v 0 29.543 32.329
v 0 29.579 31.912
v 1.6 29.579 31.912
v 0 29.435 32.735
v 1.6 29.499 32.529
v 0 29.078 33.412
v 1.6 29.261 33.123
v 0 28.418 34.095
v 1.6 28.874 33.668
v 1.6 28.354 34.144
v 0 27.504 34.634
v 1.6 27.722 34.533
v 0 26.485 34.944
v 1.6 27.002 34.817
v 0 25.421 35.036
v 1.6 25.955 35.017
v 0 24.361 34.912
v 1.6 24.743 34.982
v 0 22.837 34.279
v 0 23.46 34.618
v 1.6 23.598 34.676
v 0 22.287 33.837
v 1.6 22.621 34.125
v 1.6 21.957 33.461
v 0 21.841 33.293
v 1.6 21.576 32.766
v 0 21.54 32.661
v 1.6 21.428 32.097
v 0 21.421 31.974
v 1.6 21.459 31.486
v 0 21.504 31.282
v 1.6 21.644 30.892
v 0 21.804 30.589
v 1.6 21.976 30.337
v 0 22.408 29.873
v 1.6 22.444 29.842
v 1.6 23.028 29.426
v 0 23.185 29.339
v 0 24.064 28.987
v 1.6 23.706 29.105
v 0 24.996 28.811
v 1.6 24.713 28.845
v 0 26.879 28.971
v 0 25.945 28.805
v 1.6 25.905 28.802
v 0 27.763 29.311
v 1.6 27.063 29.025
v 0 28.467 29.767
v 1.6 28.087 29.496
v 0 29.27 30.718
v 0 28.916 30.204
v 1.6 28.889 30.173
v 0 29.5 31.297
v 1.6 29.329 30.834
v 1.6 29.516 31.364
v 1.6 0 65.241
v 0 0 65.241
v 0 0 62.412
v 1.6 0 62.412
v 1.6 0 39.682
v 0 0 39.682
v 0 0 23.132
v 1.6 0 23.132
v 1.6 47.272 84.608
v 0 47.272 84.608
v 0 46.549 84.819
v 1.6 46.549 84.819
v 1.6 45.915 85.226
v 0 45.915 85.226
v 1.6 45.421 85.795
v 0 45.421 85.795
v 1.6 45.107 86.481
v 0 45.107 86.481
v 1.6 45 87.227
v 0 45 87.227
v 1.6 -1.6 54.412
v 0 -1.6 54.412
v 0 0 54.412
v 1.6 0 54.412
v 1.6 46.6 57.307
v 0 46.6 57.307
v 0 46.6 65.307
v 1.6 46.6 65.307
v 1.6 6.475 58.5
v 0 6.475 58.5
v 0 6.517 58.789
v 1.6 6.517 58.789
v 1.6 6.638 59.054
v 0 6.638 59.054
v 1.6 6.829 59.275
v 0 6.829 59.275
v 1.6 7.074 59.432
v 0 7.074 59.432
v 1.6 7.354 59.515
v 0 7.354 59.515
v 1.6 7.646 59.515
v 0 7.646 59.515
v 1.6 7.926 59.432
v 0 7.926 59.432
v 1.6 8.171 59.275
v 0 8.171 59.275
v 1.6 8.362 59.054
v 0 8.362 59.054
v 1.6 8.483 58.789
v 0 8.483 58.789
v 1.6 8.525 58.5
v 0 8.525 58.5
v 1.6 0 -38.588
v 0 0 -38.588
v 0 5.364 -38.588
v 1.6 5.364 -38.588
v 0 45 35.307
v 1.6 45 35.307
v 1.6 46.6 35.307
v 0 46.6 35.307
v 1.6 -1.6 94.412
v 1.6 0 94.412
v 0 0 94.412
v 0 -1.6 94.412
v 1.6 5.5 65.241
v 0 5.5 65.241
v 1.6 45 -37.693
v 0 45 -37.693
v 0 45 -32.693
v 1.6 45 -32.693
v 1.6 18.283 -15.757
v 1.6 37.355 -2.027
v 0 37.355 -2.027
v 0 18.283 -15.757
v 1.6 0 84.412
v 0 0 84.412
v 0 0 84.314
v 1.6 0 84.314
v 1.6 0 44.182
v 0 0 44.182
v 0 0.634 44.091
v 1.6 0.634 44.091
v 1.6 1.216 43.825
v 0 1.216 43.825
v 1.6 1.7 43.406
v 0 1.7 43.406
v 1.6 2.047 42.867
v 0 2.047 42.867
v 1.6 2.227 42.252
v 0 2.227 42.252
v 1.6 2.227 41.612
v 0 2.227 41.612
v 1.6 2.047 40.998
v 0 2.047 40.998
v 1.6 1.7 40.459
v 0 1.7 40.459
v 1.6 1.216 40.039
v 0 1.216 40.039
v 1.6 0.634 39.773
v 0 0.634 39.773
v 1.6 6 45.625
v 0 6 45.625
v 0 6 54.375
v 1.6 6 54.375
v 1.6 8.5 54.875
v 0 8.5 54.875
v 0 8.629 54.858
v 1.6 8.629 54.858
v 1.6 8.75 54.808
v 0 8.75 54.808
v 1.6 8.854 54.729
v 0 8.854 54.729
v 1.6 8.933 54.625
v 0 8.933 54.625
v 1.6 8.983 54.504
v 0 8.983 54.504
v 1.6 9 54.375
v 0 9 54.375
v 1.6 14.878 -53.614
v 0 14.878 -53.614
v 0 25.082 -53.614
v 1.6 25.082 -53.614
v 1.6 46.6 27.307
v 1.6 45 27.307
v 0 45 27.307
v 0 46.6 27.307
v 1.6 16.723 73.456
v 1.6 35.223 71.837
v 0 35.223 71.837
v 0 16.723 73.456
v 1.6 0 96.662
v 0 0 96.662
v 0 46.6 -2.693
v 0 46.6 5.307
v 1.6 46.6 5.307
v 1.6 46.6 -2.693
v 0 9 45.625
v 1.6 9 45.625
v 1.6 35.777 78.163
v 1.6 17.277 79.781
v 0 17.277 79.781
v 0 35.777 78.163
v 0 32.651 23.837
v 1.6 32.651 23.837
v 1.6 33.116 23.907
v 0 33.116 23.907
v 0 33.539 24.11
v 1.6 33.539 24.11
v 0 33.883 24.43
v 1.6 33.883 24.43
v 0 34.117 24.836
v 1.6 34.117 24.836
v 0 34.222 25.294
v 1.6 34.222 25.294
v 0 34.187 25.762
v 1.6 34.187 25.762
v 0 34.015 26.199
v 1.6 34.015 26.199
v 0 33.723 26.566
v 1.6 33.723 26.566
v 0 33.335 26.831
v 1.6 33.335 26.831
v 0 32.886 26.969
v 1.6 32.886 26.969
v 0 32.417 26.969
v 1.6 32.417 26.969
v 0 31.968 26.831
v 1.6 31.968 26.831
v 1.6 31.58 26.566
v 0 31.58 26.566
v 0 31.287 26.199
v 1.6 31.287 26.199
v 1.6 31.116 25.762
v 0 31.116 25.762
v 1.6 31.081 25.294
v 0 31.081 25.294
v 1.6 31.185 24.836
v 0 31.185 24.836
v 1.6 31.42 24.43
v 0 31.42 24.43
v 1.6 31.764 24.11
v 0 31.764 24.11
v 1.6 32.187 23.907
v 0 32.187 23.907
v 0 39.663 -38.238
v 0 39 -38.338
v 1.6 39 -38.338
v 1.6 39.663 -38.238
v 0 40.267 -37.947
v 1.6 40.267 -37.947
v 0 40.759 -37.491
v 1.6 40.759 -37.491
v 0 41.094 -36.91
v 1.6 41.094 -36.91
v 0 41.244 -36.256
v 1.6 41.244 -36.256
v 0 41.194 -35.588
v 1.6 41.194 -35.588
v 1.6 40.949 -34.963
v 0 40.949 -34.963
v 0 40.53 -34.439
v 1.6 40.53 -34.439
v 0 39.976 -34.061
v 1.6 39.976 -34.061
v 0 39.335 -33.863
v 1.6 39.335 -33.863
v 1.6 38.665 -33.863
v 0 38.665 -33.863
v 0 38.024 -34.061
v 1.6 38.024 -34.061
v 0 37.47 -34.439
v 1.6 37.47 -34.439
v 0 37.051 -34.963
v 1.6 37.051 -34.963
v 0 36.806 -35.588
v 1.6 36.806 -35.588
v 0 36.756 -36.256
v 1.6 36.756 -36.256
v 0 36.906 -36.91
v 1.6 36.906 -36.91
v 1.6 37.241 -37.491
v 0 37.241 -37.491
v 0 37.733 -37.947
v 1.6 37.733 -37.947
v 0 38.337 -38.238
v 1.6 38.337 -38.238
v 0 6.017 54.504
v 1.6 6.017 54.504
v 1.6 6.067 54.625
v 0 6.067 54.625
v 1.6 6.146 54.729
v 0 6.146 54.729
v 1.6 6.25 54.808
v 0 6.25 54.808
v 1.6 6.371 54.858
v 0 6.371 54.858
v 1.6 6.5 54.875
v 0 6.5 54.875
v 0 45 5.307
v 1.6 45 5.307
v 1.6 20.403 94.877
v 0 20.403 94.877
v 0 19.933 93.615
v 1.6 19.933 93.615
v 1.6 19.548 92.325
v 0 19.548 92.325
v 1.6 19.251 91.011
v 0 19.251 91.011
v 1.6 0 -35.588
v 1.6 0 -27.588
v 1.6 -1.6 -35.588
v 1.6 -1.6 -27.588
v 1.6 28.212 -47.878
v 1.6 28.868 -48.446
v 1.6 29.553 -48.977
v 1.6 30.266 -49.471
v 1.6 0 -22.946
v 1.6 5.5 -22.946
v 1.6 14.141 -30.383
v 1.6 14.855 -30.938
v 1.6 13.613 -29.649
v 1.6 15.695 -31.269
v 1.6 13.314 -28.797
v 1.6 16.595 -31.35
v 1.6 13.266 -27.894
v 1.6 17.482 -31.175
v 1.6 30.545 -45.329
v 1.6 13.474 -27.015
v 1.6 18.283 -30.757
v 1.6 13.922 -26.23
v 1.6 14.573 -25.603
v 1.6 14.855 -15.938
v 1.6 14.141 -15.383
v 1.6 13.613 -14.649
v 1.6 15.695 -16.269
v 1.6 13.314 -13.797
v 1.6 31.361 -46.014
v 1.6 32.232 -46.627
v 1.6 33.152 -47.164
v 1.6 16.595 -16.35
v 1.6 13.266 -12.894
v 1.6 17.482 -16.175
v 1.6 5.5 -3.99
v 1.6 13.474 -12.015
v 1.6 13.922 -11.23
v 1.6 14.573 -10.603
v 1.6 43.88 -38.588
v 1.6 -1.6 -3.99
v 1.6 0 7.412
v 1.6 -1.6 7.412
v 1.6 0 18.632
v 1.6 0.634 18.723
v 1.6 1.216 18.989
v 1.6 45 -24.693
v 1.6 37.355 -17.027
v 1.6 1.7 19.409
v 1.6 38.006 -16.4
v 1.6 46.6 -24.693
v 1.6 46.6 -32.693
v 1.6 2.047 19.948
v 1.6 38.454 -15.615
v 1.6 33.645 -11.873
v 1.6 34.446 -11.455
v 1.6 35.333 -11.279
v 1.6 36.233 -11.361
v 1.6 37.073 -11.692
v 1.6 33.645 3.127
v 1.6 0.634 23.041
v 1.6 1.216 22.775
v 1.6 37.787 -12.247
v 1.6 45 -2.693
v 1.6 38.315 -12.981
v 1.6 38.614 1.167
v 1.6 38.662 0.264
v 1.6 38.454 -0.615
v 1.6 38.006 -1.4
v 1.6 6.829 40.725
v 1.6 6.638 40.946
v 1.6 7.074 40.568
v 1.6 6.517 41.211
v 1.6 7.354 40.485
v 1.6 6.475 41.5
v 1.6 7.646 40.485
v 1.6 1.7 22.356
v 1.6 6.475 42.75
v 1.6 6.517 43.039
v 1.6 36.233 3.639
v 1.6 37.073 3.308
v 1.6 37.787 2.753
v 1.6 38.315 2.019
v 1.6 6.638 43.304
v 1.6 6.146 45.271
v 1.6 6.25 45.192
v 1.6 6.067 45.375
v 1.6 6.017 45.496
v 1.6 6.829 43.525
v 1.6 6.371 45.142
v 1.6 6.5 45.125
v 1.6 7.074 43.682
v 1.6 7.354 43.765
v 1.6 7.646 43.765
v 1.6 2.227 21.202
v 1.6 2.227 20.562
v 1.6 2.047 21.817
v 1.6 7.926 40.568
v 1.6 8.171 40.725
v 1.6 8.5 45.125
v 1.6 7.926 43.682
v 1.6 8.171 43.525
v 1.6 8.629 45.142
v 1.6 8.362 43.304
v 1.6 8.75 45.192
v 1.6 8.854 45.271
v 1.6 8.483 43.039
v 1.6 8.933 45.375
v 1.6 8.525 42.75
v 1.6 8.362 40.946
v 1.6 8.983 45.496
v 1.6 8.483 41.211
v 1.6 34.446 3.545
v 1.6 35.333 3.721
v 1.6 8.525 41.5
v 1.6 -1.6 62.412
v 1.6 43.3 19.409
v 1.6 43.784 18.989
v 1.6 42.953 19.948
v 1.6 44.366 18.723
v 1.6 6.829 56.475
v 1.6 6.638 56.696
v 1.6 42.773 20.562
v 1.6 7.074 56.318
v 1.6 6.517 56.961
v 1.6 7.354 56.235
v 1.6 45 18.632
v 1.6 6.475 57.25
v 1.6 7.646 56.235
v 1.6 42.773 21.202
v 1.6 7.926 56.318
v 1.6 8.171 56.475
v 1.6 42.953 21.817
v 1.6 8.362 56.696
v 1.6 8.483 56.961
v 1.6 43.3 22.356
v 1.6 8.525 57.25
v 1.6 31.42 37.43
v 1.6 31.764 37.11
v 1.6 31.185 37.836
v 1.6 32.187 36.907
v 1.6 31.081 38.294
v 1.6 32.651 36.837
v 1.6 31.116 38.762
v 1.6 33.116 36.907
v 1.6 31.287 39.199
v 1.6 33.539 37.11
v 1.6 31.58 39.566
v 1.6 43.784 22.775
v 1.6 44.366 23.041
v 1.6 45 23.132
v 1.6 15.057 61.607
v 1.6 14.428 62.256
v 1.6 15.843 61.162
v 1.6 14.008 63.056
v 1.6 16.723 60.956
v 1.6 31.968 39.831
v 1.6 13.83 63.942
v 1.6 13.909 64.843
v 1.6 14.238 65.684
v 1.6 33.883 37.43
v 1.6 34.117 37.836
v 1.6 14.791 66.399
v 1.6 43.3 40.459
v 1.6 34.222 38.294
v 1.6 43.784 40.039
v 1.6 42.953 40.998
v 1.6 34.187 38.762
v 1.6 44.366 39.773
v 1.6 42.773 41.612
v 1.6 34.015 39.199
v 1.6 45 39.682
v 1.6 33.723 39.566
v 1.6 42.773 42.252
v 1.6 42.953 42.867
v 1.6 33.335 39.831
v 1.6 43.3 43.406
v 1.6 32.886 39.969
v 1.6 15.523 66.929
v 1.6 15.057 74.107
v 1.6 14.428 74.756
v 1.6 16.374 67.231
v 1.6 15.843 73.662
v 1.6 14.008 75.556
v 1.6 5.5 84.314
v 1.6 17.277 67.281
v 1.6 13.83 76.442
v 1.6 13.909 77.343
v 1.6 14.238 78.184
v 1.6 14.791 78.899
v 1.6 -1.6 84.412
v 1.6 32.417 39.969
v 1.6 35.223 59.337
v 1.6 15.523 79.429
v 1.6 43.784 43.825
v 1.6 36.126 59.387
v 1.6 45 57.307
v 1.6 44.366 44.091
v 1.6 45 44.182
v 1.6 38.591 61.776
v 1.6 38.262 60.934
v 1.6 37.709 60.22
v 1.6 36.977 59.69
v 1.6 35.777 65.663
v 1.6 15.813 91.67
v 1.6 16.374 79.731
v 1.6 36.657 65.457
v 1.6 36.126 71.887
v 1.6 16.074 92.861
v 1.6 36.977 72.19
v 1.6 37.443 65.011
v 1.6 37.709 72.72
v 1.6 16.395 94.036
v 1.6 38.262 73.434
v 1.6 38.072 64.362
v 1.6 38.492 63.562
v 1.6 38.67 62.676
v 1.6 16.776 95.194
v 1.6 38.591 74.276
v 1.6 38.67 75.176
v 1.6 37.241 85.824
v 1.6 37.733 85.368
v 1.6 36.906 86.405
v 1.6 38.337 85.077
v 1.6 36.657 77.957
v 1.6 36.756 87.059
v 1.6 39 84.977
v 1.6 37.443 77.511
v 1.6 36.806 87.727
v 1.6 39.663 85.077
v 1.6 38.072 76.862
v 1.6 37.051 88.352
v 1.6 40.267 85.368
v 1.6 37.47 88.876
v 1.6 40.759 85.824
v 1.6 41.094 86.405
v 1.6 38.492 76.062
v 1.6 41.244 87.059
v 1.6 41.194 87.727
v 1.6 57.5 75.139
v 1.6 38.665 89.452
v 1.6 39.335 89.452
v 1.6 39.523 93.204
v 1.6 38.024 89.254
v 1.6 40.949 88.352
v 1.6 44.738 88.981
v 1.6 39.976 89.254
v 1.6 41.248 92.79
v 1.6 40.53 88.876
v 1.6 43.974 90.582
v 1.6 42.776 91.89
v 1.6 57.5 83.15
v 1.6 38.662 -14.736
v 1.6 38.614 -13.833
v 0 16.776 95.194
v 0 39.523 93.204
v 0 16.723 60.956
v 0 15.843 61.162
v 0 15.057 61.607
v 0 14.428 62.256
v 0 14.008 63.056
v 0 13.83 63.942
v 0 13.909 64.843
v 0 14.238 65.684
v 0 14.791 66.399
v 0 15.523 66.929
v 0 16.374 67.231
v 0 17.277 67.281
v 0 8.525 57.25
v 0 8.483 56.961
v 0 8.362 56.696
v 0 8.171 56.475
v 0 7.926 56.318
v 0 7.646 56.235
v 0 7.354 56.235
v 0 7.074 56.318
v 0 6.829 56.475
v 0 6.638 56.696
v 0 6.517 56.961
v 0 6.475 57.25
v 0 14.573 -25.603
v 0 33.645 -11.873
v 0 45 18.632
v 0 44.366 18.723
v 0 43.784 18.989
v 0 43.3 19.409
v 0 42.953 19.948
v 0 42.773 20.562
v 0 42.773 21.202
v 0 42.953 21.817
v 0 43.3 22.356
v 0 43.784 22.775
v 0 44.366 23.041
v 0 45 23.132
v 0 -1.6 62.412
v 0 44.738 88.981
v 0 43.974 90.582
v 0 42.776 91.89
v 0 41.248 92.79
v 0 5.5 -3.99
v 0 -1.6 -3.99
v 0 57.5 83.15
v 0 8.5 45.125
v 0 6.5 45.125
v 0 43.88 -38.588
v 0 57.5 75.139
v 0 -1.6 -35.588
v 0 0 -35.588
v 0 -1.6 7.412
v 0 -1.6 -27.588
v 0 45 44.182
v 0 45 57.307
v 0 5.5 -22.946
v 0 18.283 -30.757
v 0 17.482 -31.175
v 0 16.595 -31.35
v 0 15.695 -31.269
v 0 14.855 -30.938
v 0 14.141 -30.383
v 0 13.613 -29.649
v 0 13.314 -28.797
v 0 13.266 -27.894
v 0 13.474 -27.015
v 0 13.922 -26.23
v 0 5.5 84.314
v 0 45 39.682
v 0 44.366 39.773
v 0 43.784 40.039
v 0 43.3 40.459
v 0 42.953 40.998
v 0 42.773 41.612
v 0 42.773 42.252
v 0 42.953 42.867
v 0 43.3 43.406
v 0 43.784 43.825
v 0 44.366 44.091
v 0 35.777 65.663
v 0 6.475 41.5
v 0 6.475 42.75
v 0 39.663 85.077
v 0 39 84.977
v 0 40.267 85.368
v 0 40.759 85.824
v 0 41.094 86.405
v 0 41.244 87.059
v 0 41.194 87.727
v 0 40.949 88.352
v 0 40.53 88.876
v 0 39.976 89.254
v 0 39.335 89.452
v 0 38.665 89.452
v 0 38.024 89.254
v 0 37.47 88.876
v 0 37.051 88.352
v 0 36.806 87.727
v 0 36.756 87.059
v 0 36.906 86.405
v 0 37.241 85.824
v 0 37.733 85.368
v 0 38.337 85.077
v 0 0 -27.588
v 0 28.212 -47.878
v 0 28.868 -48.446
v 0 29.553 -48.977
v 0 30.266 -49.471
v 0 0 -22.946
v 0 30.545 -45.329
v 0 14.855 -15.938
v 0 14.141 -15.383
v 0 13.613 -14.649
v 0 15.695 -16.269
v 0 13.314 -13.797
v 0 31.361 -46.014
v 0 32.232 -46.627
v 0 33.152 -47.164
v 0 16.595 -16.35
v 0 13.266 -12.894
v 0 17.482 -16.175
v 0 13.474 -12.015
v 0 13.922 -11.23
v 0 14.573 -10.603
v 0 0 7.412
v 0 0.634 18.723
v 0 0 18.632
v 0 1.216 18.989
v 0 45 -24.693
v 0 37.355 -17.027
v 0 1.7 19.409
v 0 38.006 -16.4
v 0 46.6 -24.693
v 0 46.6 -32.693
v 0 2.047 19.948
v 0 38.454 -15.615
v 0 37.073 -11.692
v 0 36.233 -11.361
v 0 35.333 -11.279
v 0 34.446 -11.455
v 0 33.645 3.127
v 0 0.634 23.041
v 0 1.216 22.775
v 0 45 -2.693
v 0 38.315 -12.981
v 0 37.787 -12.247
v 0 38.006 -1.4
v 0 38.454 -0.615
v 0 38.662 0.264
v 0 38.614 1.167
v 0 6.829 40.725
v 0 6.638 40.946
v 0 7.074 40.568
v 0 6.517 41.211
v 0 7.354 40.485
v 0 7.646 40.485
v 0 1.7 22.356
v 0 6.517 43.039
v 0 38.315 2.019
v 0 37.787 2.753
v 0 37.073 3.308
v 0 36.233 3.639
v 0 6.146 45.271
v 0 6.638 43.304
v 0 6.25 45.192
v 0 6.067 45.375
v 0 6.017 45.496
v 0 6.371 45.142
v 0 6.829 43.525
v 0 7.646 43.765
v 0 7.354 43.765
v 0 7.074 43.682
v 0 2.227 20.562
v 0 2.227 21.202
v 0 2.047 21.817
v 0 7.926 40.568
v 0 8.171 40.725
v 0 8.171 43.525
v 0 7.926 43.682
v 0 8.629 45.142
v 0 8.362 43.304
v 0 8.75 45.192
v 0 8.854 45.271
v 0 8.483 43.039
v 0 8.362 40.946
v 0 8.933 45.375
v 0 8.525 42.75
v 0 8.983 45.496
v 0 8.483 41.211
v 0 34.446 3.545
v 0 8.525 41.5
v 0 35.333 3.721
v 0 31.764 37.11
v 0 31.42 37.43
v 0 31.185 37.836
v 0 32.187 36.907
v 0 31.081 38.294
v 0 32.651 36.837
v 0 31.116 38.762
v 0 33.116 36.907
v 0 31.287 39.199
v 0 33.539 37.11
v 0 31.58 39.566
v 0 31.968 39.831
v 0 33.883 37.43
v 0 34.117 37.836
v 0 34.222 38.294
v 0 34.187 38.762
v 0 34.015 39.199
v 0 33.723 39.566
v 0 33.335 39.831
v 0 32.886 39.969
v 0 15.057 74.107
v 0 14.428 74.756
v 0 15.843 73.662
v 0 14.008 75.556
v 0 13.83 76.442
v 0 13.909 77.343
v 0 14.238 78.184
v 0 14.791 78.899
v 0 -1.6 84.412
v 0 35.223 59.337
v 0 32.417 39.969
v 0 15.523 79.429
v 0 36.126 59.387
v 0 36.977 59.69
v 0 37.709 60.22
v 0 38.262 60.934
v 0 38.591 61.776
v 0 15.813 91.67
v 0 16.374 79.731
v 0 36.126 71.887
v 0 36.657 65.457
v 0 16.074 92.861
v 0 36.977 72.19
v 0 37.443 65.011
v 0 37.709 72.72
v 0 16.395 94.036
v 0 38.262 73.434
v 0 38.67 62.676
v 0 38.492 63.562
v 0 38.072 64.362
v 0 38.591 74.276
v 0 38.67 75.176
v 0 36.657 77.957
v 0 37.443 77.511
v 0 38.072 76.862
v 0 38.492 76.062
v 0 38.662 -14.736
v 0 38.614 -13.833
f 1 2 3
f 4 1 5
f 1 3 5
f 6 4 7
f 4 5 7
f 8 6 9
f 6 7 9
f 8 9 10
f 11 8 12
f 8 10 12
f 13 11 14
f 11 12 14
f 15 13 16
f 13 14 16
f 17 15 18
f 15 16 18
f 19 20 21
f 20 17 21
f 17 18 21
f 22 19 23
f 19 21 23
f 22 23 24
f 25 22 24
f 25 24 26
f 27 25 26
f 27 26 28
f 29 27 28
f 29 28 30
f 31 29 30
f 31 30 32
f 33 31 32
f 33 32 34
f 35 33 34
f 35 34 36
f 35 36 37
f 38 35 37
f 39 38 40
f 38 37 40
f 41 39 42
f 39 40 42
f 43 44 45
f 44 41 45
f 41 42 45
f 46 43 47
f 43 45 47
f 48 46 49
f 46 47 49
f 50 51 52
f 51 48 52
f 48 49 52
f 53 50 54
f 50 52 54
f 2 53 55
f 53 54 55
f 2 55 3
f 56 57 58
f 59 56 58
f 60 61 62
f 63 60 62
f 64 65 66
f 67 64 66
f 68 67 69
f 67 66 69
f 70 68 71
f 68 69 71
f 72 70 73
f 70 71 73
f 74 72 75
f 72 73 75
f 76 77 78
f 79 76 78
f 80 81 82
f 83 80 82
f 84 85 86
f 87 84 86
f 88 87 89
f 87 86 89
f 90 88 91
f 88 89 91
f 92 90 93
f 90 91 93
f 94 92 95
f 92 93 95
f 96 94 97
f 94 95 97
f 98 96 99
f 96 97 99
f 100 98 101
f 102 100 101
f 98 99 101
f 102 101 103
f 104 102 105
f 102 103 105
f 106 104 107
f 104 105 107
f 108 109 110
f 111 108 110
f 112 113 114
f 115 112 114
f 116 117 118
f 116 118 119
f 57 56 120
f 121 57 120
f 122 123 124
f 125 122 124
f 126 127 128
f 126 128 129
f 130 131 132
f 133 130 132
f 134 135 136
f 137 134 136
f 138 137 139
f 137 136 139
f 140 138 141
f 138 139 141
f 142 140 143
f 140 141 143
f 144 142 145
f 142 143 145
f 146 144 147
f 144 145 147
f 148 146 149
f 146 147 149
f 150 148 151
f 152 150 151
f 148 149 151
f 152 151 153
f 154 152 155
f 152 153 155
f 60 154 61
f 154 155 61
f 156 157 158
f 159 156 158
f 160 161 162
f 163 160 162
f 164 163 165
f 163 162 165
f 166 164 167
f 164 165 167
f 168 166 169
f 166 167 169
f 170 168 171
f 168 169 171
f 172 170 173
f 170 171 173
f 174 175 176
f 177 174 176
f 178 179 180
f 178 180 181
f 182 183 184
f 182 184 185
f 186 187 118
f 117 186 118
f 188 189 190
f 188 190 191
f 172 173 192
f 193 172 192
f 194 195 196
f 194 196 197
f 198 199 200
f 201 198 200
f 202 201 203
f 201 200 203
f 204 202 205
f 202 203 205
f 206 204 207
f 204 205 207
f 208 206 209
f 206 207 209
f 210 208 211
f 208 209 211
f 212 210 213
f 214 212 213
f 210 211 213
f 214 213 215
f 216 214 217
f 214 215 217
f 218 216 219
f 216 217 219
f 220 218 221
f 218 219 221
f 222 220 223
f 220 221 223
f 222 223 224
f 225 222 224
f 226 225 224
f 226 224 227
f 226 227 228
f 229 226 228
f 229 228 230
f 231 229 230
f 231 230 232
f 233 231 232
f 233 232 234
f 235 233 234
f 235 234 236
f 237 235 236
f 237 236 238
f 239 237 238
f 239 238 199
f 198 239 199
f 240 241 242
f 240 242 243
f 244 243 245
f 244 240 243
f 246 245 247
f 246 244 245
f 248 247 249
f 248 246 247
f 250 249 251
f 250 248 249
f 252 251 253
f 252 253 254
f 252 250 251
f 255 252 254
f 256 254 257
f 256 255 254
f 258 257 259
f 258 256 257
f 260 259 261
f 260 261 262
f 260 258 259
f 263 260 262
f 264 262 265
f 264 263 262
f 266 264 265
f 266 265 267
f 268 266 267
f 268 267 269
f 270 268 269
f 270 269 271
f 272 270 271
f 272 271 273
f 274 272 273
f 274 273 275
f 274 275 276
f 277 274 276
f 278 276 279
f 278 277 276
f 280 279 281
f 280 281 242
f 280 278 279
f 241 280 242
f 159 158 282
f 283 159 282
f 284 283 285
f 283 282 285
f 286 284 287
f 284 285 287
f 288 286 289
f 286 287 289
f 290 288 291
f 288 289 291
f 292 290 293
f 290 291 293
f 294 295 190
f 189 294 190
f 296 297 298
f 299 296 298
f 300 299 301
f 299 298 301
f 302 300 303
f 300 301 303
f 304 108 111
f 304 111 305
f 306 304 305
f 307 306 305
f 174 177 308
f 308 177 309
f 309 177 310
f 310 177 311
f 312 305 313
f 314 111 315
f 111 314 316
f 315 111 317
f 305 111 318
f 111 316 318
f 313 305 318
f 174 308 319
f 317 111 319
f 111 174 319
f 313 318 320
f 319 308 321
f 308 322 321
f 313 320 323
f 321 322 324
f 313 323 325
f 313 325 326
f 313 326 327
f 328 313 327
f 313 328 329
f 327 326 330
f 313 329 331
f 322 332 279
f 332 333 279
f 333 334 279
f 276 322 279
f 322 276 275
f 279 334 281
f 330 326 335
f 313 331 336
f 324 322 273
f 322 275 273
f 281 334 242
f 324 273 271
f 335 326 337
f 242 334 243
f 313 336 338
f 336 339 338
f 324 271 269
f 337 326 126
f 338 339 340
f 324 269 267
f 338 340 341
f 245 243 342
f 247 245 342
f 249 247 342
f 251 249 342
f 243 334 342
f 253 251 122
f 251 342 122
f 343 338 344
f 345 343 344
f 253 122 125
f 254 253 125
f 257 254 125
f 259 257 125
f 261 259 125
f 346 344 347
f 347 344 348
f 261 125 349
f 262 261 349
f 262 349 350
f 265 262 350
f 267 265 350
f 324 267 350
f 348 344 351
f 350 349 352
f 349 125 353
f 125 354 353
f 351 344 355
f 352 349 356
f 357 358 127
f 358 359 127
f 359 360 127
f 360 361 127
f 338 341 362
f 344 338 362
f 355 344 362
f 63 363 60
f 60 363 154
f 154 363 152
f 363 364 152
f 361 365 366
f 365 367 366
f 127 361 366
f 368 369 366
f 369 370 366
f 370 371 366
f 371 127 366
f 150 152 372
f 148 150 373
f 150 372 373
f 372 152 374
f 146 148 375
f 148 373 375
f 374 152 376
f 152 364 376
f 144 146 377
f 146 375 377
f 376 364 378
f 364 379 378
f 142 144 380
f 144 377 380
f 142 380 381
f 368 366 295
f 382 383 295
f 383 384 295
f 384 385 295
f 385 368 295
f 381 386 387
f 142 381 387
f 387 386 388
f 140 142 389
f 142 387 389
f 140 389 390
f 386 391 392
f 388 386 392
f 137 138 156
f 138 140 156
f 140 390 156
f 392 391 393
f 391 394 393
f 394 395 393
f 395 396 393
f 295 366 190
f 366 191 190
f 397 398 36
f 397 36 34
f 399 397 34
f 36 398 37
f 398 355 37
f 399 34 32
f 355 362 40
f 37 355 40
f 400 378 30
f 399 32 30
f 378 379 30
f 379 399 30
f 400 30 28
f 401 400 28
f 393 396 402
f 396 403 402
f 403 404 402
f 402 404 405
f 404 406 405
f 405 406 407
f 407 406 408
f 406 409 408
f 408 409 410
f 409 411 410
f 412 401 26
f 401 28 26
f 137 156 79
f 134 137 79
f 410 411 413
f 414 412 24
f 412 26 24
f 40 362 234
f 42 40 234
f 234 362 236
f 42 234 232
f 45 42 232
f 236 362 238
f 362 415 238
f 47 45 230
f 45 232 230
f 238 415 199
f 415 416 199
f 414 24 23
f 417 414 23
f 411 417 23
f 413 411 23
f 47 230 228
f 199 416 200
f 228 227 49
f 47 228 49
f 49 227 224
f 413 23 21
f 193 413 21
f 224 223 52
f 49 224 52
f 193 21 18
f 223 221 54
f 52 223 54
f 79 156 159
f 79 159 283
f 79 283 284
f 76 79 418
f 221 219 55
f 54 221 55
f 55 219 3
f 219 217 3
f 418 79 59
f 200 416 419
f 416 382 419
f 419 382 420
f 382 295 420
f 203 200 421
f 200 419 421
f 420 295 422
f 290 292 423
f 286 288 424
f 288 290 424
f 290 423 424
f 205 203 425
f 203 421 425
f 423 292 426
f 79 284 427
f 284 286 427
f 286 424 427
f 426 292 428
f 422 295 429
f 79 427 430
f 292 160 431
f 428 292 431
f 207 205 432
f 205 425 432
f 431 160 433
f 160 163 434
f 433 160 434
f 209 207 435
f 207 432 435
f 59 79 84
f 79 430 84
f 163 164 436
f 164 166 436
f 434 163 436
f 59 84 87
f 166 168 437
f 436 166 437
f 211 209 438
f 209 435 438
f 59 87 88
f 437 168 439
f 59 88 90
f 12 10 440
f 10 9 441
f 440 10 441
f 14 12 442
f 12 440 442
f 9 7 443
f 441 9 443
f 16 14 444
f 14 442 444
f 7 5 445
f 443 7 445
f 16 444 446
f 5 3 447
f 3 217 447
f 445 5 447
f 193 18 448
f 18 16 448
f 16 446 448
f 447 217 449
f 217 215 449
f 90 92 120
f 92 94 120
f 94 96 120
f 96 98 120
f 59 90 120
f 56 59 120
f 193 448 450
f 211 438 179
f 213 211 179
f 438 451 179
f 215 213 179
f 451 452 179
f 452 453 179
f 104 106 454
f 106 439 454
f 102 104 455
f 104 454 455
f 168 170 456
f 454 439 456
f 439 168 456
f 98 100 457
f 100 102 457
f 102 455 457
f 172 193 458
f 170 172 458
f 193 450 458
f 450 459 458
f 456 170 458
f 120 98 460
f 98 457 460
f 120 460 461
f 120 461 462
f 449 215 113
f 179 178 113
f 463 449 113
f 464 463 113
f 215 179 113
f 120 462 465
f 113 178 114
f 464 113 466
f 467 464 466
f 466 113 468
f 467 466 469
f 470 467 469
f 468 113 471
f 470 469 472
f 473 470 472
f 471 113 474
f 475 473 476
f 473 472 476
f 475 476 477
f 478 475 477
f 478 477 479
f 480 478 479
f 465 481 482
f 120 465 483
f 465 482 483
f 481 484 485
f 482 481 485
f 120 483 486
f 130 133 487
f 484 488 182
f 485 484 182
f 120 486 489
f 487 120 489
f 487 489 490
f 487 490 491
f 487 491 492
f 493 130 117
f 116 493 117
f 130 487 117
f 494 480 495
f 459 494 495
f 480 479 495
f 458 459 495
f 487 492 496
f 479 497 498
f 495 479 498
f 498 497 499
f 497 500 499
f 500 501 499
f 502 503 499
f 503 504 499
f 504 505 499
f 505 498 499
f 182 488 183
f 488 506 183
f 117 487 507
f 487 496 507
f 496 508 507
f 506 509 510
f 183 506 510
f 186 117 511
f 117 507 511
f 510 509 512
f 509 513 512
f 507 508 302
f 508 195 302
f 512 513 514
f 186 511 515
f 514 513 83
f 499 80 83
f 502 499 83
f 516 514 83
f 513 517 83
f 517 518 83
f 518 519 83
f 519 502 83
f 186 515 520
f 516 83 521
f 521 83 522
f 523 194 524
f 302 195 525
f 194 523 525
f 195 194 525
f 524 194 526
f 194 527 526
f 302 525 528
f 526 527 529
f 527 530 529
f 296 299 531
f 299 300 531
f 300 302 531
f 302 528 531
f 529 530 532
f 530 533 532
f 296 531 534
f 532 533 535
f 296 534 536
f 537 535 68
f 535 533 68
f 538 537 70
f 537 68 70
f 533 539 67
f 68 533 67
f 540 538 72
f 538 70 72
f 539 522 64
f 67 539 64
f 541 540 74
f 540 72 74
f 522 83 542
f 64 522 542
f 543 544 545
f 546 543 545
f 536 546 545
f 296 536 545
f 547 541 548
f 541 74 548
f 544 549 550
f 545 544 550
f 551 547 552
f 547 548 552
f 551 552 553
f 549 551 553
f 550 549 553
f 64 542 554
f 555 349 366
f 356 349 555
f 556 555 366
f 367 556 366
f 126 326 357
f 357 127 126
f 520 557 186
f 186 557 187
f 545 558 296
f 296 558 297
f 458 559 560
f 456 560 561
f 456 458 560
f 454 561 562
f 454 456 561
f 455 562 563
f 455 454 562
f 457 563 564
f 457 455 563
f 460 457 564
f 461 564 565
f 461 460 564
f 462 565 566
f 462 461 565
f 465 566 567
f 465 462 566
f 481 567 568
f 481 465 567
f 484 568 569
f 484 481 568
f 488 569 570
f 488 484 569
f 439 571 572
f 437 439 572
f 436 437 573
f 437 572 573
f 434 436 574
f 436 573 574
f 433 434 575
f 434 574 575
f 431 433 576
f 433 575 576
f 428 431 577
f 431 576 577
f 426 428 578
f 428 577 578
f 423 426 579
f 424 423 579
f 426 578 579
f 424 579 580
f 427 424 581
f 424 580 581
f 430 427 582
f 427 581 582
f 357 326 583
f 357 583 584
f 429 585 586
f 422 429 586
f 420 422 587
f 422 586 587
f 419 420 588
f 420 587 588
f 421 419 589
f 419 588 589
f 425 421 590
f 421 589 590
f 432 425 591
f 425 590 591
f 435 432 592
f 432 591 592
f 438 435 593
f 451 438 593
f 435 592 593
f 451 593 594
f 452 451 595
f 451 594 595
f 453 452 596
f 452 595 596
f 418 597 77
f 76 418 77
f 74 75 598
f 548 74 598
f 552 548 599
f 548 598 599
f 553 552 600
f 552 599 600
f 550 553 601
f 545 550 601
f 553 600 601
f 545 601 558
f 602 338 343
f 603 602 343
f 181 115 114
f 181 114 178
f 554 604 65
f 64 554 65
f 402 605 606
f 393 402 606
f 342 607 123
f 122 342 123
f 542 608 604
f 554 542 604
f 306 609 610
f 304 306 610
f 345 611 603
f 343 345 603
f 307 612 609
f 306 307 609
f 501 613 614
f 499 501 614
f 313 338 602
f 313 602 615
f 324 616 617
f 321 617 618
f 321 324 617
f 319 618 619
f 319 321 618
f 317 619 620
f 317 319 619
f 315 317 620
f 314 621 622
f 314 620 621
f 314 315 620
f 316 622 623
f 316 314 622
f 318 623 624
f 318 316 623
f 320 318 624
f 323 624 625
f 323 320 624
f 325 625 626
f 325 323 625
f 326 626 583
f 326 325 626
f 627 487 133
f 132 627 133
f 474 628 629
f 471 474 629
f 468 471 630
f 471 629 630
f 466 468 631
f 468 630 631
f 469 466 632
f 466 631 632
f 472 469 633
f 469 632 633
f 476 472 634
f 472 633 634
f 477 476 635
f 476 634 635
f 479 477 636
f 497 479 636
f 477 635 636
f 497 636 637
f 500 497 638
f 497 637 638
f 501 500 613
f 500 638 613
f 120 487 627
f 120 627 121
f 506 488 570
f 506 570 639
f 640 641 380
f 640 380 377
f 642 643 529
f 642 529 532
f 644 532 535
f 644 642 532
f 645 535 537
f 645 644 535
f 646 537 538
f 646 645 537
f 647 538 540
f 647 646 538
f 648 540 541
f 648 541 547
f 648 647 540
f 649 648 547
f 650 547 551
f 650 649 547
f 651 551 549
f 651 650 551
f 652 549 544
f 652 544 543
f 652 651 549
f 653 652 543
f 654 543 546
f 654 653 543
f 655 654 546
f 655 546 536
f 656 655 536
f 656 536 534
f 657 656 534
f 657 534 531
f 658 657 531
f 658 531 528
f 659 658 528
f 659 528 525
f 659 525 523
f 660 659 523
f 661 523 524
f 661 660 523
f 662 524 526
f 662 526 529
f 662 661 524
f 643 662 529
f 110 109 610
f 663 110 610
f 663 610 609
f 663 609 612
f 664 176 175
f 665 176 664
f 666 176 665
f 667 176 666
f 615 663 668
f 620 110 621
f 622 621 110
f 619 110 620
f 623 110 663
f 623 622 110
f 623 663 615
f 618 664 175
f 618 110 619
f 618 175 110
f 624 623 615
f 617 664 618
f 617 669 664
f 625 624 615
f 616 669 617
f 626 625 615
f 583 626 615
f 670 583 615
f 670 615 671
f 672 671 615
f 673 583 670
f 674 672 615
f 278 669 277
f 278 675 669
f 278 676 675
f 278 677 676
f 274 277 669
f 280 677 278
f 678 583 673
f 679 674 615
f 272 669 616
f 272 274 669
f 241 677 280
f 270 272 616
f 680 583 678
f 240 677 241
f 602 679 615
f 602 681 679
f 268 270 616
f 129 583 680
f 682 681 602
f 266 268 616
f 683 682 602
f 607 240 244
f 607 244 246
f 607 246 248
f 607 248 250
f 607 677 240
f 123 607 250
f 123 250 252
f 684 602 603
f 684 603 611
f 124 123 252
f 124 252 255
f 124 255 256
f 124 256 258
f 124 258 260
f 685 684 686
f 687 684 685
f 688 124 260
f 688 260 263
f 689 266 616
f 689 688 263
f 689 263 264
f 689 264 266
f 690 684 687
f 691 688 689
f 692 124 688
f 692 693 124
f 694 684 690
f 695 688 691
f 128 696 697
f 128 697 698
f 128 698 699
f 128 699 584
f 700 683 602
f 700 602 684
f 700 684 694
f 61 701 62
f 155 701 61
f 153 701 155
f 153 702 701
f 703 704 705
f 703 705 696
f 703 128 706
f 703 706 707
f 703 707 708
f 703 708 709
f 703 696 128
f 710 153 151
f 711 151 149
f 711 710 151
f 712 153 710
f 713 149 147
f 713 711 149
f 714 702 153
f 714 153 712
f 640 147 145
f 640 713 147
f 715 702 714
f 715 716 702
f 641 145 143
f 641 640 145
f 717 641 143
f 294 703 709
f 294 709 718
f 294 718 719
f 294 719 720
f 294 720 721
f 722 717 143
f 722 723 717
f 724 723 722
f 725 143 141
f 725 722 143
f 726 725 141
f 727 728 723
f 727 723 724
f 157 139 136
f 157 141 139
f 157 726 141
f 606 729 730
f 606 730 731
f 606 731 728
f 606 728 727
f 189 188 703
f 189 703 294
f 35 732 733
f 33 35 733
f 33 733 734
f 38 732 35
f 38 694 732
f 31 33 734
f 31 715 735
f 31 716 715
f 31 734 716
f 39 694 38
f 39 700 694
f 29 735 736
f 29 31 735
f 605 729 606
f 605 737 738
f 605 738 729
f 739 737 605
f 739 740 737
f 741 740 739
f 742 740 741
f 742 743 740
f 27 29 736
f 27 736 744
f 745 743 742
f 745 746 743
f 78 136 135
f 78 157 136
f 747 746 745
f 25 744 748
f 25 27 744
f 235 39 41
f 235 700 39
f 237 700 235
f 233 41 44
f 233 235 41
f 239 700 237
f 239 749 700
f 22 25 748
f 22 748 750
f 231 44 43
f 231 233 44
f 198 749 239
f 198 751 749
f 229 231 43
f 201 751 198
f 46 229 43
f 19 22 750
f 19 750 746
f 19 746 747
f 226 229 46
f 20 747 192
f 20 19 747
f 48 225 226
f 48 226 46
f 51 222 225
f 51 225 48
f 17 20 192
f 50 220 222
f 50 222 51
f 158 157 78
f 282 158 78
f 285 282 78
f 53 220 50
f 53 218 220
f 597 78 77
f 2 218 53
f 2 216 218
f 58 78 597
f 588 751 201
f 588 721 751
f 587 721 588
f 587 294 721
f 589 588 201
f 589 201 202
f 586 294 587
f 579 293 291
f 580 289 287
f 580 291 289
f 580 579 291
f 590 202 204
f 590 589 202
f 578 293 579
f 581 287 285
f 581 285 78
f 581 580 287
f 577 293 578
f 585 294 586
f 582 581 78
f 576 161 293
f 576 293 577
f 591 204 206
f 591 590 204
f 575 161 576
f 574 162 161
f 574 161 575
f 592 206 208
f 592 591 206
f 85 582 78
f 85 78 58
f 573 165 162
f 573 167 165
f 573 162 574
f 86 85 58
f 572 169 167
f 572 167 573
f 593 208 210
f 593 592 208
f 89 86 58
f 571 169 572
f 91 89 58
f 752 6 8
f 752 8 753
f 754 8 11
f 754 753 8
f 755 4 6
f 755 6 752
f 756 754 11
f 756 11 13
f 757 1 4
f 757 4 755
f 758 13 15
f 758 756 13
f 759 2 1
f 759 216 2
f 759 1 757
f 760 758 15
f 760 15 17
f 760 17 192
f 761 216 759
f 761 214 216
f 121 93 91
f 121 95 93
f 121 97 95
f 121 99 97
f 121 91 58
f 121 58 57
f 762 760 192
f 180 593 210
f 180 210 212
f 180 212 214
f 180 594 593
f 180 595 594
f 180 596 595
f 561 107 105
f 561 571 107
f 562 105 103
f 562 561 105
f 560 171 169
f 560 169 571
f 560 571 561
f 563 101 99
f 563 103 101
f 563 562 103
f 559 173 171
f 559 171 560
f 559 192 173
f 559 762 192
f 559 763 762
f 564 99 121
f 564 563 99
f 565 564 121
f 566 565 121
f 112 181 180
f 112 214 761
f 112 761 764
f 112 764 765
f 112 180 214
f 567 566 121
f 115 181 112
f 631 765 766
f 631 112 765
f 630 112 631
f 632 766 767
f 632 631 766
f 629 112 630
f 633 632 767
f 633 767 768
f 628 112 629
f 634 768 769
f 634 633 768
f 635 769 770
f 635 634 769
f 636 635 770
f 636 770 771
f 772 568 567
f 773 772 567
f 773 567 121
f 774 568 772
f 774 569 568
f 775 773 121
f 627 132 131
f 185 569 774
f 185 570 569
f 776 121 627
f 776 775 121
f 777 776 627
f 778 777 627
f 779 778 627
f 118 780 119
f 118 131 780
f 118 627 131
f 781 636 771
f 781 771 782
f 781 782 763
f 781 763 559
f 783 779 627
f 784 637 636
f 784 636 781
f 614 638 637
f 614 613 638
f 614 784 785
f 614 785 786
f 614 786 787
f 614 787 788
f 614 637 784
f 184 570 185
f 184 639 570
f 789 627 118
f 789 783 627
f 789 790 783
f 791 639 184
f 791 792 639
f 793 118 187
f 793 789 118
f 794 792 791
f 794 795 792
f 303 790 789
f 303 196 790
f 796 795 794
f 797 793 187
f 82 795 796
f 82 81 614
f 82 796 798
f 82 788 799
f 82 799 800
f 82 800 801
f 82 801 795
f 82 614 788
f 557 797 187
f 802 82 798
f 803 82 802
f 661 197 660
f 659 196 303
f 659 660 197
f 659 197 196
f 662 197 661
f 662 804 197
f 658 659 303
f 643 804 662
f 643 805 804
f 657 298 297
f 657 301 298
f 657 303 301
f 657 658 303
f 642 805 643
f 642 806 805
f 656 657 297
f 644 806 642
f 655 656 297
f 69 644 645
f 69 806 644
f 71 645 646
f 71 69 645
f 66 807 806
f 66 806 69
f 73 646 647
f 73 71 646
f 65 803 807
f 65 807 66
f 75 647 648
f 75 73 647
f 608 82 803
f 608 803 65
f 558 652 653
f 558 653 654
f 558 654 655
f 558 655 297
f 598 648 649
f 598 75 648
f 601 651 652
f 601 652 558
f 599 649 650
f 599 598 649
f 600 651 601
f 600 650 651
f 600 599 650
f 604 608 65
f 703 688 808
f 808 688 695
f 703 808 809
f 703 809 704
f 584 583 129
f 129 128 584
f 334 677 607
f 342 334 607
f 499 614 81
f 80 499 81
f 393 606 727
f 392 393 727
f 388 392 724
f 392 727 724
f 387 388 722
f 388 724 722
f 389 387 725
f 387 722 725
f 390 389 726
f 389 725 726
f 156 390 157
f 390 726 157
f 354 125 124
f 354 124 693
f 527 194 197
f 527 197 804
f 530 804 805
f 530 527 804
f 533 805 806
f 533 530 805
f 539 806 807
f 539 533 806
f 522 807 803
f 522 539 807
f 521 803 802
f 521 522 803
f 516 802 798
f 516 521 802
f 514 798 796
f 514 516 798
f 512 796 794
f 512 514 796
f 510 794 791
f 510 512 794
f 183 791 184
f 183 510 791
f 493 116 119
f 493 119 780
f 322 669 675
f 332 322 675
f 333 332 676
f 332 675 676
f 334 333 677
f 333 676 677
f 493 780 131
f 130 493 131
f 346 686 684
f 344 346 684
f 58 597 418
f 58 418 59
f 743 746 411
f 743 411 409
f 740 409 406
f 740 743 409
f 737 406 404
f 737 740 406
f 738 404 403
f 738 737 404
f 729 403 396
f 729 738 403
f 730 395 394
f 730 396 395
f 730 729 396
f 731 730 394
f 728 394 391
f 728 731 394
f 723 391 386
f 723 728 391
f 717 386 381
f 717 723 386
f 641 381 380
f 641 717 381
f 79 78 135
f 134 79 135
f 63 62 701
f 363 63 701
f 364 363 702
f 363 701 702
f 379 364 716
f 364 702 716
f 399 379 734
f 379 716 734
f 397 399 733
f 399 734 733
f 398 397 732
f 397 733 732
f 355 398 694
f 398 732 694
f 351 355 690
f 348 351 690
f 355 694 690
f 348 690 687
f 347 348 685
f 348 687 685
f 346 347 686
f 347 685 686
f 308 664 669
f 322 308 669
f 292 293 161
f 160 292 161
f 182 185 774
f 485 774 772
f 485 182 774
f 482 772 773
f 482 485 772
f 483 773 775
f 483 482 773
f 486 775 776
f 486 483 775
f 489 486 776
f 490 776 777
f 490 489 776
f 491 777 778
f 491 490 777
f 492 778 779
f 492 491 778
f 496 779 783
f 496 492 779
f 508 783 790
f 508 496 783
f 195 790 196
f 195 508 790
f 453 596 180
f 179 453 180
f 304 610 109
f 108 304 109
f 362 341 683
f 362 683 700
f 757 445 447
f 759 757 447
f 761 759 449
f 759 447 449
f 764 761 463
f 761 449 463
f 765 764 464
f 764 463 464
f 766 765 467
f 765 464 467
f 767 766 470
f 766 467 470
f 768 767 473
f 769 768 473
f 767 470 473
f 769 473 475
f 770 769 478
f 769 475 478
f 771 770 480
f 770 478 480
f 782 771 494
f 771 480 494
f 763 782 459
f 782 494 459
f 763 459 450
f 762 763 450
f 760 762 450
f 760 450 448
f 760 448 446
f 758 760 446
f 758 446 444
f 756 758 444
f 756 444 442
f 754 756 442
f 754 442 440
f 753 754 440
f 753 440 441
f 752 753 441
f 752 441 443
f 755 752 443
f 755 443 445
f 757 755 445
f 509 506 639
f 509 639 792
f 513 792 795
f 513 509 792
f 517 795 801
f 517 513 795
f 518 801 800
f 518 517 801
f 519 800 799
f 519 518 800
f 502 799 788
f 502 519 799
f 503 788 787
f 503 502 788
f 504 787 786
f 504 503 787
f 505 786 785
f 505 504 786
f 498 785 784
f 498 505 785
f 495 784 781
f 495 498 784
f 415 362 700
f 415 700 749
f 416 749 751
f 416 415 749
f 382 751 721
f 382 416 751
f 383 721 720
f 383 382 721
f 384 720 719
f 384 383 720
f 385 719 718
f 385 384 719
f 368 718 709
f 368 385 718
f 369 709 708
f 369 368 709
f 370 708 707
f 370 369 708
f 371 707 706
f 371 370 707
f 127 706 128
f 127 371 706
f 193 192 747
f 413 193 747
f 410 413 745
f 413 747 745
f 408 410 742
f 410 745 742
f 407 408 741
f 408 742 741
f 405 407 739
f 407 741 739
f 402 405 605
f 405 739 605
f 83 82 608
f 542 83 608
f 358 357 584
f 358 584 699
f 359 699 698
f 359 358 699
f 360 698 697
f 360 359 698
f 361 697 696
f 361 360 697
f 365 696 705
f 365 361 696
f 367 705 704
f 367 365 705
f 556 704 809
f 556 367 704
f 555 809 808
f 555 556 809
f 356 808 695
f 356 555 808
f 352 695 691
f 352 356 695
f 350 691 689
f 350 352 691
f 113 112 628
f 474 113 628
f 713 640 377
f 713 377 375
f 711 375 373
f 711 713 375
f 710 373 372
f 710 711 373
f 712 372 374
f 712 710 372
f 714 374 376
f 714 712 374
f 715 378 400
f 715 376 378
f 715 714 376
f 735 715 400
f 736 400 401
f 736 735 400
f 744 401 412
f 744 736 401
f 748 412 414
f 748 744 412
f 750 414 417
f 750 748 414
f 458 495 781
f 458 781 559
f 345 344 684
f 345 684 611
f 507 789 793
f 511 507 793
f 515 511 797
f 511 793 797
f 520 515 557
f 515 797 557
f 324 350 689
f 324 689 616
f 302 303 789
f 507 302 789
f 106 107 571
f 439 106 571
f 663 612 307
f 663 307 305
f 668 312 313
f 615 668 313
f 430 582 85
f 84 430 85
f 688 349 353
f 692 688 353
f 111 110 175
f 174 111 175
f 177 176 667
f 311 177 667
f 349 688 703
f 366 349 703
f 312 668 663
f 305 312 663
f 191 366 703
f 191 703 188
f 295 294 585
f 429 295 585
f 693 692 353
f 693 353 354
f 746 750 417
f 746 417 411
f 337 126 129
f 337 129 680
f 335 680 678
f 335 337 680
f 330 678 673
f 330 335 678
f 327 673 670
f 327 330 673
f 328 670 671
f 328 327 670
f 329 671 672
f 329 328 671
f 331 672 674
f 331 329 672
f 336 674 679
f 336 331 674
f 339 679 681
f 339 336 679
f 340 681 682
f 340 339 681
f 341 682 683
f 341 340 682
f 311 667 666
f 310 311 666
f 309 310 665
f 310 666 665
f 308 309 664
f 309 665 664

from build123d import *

# Parameters (mm, degrees)
SKETCH_218_R           = 2.25
EXTRUDE_1_DEPTH        = 1.6
SKETCH_2_W             = 8
SKETCH_2_H             = 1.6
EXTRUDE_3412_DEPTH     = 1.6
SKETCH2_W              = 19.07286805
SKETCH2_H              = 5.5
SKETCH2_H_2            = 5.238743847
SKETCH2_W_2            = 18.956012289
SKETCH2_H_3            = 4.1
CUT_EXTRUDE_4293_DEPTH = 113.482438083
SKETCH_4339_R          = 1.575
SKETCH_4339_RX         = 4.079397779
SKETCH_4339_RY         = 3.125
CUT_EXTRUDE_4732_DEPTH = 113.482438083
CUT_EXTRUDE_5198_DEPTH = 113.482438221
USB_C_DEPTH            = 113.482438221
BOSS_EXTRUDE1_DEPTH    = 1.6


with BuildPart() as part:
    # Sketch 218 → 凸台-拉伸1 (new body)
    with BuildSketch(Plane(origin=(0, 0, 0), x_dir=(0, 0, -1), z_dir=(1, 0, 0))):
        with BuildLine():
            Line((-95.193976275, 16.776432698), (-96.66172395, 0))
            Line((-96.66172395, 0), (-44.182229478, 0))
            ThreePointArc((-44.182229478, 0), (-41.932229478, 2.25), (-39.682229478, 0))
            Line((-39.682229478, 0), (-23.132229478, 0))
            ThreePointArc((-23.132229478, 0), (-20.882229478, 2.25), (-18.632229478, 0))
            Line((-18.632229478, 0), (38.58827605, 0))
            Line((38.58827605, 0), (38.58827605, 5.363667343))
            Line((38.58827605, 5.363667343), (53.613979238, 14.877821069))
            Line((53.613979238, 14.877821069), (53.613979238, 25.082386187))
            Line((53.613979238, 25.082386187), (49.47062371, 30.265958003))
            ThreePointArc((49.47062371, 30.265958003), (48.71615842, 29.206772475), (47.878069959, 28.212438733))
            Line((47.878069959, 28.212438733), (45.32875497, 30.545040291))
            ThreePointArc((45.32875497, 30.545040291), (46.329625978, 31.78976103), (47.163951689, 33.151735001))
            Line((47.163951689, 33.151735001), (38.58827605, 43.88038965))
            Line((38.58827605, 43.88038965), (37.693344157, 45))
            Line((37.693344157, 45), (-18.632229478, 45))
            ThreePointArc((-18.632229478, 45), (-20.882229478, 42.75), (-23.132229478, 45))
            Line((-23.132229478, 45), (-39.682229478, 45))
            ThreePointArc((-39.682229478, 45), (-41.932229478, 42.75), (-44.182229478, 45))
            Line((-44.182229478, 45), (-87.226747047, 45))
            ThreePointArc((-87.226747047, 45), (-91.280288293, 43.423664021), (-93.203915236, 39.522934456))
            Line((-93.203915236, 39.522934456), (-94.87665585, 20.403421746))
            ThreePointArc((-94.87665585, 20.403421746), (-92.972963578, 19.729950103), (-91.011324976, 19.250802615))
            Line((-91.011324976, 19.250802615), (-91.670050843, 15.813350036))
            ThreePointArc((-91.670050843, 15.813350036), (-93.450669808, 16.226628035), (-95.193976275, 16.776432698))
        make_face()
        with Locations((-87.226747047, 39)):
            Circle(SKETCH_218_R, mode=Mode.SUBTRACT)
        with Locations((36.08827605, 39)):
            Circle(SKETCH_218_R, mode=Mode.SUBTRACT)
    extrude(amount=EXTRUDE_1_DEPTH)

    # 草图2 → Extrude 3412 (add)
    with BuildSketch(Plane(origin=(0, 0, 0), x_dir=(0, 0, -1), z_dir=(1, 0, 0))):
        with Locations((31.58827605, -0.8)):
            Rectangle(SKETCH_2_W, SKETCH_2_H)
        with BuildLine():
            Line((-83.150237988, 57.5), (-84.607683433, 47.272305319))
            ThreePointArc((-84.607683433, 47.272305319), (-85.493046837, 45.647255317), (-87.226747047, 45))
            Line((-87.226747047, 45), (-65.306655843, 45))
            Line((-65.306655843, 45), (-57.306655843, 45))
            Line((-57.306655843, 45), (-57.306655843, 46.6))
            Line((-57.306655843, 46.6), (-65.306655843, 46.6))
            Line((-65.306655843, 46.6), (-75.139107316, 57.5))
            Line((-75.139107316, 57.5), (-83.150237988, 57.5))
        make_face()
        with Locations((1.58827605, -0.8)):
            Rectangle(SKETCH_2_W, SKETCH_2_H)
        with Locations((-58.41172395, -0.8)):
            Rectangle(SKETCH_2_W, SKETCH_2_H)
        with Locations((-88.41172395, -0.8)):
            Rectangle(SKETCH_2_W, SKETCH_2_H)
        with Locations((28.693344157, 45.8)):
            Rectangle(SKETCH_2_W, SKETCH_2_H)
        with Locations((-1.306655843, 45.8)):
            Rectangle(SKETCH_2_W, SKETCH_2_H)
        with Locations((-31.306655843, 45.8)):
            Rectangle(SKETCH_2_W, SKETCH_2_H)
    extrude(amount=EXTRUDE_3412_DEPTH)

    # Sketch2 → Cut-Extrude 4293 (cut, through all)
    with BuildSketch(Plane(origin=(1.6, 0, 0), x_dir=(0, 0, -1), z_dir=(1, 0, 0))):
        with Locations((-74.777688237, 2.75)):
            Rectangle(SKETCH2_W, SKETCH2_H)
        with Locations((-74.777688237, -2.619371924)):
            Rectangle(SKETCH2_W, SKETCH2_H_2)
        with Locations((13.467678305, 2.75)):
            Rectangle(SKETCH2_W_2, SKETCH2_H)
        with Locations((13.467678305, -2.05)):
            Rectangle(SKETCH2_W_2, SKETCH2_H_3)
    extrude(amount=-CUT_EXTRUDE_4293_DEPTH, mode=Mode.SUBTRACT)

    # Sketch 4339 → Cut-Extrude 4732 (cut, through all)
    with BuildSketch(Plane(origin=(1.6, 0, 0), x_dir=(0, 0, -1), z_dir=(1, 0, 0))):
        with Locations((-38.41172395, 32.651369249)):
            Circle(SKETCH_4339_R)
        with Locations((-25.41172395, 32.651369249)):
            Circle(SKETCH_4339_R)
        with Locations(Location((-31.91172395, 25.5), (0, 0, 90))):
            Ellipse(SKETCH_4339_RX, SKETCH_4339_RY)
    extrude(amount=-CUT_EXTRUDE_4732_DEPTH, mode=Mode.SUBTRACT)

    # 草图3 → Cut-Extrude 5198 (cut, through all)
    with BuildSketch(Plane(origin=(1.6, 0, 0), x_dir=(0, 0, -1), z_dir=(1, 0, 0))):
        with BuildLine():
            Line((-71.837081834, 35.223280517), (-73.455622109, 16.723280517))
            ThreePointArc((-73.455622109, 16.723280517), (-76.895259758, 13.837081834), (-79.781458442, 17.276719483))
            Line((-79.781458442, 17.276719483), (-78.162918166, 35.776719483))
            ThreePointArc((-78.162918166, 35.776719483), (-74.723280517, 38.662918166), (-71.837081834, 35.223280517))
        make_face()
        with BuildLine():
            Line((17.026747393, 37.354992688), (30.756614535, 18.283004112))
            ThreePointArc((30.756614535, 18.283004112), (30.034859831, 13.851264031), (25.60311975, 14.573018735))
            Line((25.60311975, 14.573018735), (11.873252607, 33.645007312))
            ThreePointArc((11.873252607, 33.645007312), (12.595007312, 38.076747393), (17.026747393, 37.354992688))
        make_face()
        with BuildLine():
            Line((2.026747393, 37.354992688), (15.756614535, 18.283004112))
            ThreePointArc((15.756614535, 18.283004112), (15.034859831, 13.851264031), (10.60311975, 14.573018735))
            Line((10.60311975, 14.573018735), (-3.126747393, 33.645007312))
            ThreePointArc((-3.126747393, 33.645007312), (-2.404992688, 38.076747393), (2.026747393, 37.354992688))
        make_face()
        with BuildLine():
            Line((-59.337081834, 35.223280517), (-60.955622109, 16.723280517))
            ThreePointArc((-60.955622109, 16.723280517), (-64.395259758, 13.837081834), (-67.281458442, 17.276719483))
            Line((-67.281458442, 17.276719483), (-65.662918166, 35.776719483))
            ThreePointArc((-65.662918166, 35.776719483), (-62.223280517, 38.662918166), (-59.337081834, 35.223280517))
        make_face()
    extrude(amount=-CUT_EXTRUDE_5198_DEPTH, mode=Mode.SUBTRACT)

    # Sketch1 → USB-C供电接口 (cut, through all)
    with BuildSketch(Plane(origin=(0, 0, 0), x_dir=(0, 0, -1), z_dir=(1, 0, 0))):
        with BuildLine():
            Line((-54.375, 9), (-45.625, 9))
            ThreePointArc((-45.625, 9), (-45.271446609, 8.853553391), (-45.125, 8.5))
            Line((-45.125, 8.5), (-45.125, 6.5))
            ThreePointArc((-45.125, 6.5), (-45.271446609, 6.146446609), (-45.625, 6))
            Line((-45.625, 6), (-54.375, 6))
            ThreePointArc((-54.375, 6), (-54.728553391, 6.146446609), (-54.875, 6.5))
            Line((-54.875, 6.5), (-54.875, 8.5))
            ThreePointArc((-54.875, 8.5), (-54.728553391, 8.853553391), (-54.375, 9))
        make_face()
        with BuildLine():
            Line((-57.25, 6.475), (-58.5, 6.475))
            ThreePointArc((-58.5, 6.475), (-59.525, 7.5), (-58.5, 8.525))
            Line((-58.5, 8.525), (-57.25, 8.525))
            ThreePointArc((-57.25, 8.525), (-56.225, 7.5), (-57.25, 6.475))
        make_face()
        with BuildLine():
            Line((-42.75, 6.475), (-41.5, 6.475))
            ThreePointArc((-41.5, 6.475), (-40.475, 7.5), (-41.5, 8.525))
            Line((-41.5, 8.525), (-42.75, 8.525))
            ThreePointArc((-42.75, 8.525), (-43.775, 7.5), (-42.75, 6.475))
        make_face()
    extrude(amount=USB_C_DEPTH, mode=Mode.SUBTRACT)

    # Sketch3 → Boss-Extrude1 (add)
    with BuildSketch(Plane(origin=(1.6, 0, 0), x_dir=(0, 0, -1), z_dir=(1, 0, 0))):
        Polygon((-92.41172395, -1.6), (-94.41172395, -1.6), (-94.41172395, 0), (-94.41172395, 0.25), (-92.16172395, 0.25), (-92.16172395, -1.6), align=None)
        Polygon((-2.41172395, -1.6), (-7.41172395, -1.6), (-7.41172395, 0), (-7.41172395, 0.25), (-2.16172395, 0.25), (-2.16172395, -1.6), align=None)
    extrude(amount=-BOSS_EXTRUDE1_DEPTH)


solid = part.part
